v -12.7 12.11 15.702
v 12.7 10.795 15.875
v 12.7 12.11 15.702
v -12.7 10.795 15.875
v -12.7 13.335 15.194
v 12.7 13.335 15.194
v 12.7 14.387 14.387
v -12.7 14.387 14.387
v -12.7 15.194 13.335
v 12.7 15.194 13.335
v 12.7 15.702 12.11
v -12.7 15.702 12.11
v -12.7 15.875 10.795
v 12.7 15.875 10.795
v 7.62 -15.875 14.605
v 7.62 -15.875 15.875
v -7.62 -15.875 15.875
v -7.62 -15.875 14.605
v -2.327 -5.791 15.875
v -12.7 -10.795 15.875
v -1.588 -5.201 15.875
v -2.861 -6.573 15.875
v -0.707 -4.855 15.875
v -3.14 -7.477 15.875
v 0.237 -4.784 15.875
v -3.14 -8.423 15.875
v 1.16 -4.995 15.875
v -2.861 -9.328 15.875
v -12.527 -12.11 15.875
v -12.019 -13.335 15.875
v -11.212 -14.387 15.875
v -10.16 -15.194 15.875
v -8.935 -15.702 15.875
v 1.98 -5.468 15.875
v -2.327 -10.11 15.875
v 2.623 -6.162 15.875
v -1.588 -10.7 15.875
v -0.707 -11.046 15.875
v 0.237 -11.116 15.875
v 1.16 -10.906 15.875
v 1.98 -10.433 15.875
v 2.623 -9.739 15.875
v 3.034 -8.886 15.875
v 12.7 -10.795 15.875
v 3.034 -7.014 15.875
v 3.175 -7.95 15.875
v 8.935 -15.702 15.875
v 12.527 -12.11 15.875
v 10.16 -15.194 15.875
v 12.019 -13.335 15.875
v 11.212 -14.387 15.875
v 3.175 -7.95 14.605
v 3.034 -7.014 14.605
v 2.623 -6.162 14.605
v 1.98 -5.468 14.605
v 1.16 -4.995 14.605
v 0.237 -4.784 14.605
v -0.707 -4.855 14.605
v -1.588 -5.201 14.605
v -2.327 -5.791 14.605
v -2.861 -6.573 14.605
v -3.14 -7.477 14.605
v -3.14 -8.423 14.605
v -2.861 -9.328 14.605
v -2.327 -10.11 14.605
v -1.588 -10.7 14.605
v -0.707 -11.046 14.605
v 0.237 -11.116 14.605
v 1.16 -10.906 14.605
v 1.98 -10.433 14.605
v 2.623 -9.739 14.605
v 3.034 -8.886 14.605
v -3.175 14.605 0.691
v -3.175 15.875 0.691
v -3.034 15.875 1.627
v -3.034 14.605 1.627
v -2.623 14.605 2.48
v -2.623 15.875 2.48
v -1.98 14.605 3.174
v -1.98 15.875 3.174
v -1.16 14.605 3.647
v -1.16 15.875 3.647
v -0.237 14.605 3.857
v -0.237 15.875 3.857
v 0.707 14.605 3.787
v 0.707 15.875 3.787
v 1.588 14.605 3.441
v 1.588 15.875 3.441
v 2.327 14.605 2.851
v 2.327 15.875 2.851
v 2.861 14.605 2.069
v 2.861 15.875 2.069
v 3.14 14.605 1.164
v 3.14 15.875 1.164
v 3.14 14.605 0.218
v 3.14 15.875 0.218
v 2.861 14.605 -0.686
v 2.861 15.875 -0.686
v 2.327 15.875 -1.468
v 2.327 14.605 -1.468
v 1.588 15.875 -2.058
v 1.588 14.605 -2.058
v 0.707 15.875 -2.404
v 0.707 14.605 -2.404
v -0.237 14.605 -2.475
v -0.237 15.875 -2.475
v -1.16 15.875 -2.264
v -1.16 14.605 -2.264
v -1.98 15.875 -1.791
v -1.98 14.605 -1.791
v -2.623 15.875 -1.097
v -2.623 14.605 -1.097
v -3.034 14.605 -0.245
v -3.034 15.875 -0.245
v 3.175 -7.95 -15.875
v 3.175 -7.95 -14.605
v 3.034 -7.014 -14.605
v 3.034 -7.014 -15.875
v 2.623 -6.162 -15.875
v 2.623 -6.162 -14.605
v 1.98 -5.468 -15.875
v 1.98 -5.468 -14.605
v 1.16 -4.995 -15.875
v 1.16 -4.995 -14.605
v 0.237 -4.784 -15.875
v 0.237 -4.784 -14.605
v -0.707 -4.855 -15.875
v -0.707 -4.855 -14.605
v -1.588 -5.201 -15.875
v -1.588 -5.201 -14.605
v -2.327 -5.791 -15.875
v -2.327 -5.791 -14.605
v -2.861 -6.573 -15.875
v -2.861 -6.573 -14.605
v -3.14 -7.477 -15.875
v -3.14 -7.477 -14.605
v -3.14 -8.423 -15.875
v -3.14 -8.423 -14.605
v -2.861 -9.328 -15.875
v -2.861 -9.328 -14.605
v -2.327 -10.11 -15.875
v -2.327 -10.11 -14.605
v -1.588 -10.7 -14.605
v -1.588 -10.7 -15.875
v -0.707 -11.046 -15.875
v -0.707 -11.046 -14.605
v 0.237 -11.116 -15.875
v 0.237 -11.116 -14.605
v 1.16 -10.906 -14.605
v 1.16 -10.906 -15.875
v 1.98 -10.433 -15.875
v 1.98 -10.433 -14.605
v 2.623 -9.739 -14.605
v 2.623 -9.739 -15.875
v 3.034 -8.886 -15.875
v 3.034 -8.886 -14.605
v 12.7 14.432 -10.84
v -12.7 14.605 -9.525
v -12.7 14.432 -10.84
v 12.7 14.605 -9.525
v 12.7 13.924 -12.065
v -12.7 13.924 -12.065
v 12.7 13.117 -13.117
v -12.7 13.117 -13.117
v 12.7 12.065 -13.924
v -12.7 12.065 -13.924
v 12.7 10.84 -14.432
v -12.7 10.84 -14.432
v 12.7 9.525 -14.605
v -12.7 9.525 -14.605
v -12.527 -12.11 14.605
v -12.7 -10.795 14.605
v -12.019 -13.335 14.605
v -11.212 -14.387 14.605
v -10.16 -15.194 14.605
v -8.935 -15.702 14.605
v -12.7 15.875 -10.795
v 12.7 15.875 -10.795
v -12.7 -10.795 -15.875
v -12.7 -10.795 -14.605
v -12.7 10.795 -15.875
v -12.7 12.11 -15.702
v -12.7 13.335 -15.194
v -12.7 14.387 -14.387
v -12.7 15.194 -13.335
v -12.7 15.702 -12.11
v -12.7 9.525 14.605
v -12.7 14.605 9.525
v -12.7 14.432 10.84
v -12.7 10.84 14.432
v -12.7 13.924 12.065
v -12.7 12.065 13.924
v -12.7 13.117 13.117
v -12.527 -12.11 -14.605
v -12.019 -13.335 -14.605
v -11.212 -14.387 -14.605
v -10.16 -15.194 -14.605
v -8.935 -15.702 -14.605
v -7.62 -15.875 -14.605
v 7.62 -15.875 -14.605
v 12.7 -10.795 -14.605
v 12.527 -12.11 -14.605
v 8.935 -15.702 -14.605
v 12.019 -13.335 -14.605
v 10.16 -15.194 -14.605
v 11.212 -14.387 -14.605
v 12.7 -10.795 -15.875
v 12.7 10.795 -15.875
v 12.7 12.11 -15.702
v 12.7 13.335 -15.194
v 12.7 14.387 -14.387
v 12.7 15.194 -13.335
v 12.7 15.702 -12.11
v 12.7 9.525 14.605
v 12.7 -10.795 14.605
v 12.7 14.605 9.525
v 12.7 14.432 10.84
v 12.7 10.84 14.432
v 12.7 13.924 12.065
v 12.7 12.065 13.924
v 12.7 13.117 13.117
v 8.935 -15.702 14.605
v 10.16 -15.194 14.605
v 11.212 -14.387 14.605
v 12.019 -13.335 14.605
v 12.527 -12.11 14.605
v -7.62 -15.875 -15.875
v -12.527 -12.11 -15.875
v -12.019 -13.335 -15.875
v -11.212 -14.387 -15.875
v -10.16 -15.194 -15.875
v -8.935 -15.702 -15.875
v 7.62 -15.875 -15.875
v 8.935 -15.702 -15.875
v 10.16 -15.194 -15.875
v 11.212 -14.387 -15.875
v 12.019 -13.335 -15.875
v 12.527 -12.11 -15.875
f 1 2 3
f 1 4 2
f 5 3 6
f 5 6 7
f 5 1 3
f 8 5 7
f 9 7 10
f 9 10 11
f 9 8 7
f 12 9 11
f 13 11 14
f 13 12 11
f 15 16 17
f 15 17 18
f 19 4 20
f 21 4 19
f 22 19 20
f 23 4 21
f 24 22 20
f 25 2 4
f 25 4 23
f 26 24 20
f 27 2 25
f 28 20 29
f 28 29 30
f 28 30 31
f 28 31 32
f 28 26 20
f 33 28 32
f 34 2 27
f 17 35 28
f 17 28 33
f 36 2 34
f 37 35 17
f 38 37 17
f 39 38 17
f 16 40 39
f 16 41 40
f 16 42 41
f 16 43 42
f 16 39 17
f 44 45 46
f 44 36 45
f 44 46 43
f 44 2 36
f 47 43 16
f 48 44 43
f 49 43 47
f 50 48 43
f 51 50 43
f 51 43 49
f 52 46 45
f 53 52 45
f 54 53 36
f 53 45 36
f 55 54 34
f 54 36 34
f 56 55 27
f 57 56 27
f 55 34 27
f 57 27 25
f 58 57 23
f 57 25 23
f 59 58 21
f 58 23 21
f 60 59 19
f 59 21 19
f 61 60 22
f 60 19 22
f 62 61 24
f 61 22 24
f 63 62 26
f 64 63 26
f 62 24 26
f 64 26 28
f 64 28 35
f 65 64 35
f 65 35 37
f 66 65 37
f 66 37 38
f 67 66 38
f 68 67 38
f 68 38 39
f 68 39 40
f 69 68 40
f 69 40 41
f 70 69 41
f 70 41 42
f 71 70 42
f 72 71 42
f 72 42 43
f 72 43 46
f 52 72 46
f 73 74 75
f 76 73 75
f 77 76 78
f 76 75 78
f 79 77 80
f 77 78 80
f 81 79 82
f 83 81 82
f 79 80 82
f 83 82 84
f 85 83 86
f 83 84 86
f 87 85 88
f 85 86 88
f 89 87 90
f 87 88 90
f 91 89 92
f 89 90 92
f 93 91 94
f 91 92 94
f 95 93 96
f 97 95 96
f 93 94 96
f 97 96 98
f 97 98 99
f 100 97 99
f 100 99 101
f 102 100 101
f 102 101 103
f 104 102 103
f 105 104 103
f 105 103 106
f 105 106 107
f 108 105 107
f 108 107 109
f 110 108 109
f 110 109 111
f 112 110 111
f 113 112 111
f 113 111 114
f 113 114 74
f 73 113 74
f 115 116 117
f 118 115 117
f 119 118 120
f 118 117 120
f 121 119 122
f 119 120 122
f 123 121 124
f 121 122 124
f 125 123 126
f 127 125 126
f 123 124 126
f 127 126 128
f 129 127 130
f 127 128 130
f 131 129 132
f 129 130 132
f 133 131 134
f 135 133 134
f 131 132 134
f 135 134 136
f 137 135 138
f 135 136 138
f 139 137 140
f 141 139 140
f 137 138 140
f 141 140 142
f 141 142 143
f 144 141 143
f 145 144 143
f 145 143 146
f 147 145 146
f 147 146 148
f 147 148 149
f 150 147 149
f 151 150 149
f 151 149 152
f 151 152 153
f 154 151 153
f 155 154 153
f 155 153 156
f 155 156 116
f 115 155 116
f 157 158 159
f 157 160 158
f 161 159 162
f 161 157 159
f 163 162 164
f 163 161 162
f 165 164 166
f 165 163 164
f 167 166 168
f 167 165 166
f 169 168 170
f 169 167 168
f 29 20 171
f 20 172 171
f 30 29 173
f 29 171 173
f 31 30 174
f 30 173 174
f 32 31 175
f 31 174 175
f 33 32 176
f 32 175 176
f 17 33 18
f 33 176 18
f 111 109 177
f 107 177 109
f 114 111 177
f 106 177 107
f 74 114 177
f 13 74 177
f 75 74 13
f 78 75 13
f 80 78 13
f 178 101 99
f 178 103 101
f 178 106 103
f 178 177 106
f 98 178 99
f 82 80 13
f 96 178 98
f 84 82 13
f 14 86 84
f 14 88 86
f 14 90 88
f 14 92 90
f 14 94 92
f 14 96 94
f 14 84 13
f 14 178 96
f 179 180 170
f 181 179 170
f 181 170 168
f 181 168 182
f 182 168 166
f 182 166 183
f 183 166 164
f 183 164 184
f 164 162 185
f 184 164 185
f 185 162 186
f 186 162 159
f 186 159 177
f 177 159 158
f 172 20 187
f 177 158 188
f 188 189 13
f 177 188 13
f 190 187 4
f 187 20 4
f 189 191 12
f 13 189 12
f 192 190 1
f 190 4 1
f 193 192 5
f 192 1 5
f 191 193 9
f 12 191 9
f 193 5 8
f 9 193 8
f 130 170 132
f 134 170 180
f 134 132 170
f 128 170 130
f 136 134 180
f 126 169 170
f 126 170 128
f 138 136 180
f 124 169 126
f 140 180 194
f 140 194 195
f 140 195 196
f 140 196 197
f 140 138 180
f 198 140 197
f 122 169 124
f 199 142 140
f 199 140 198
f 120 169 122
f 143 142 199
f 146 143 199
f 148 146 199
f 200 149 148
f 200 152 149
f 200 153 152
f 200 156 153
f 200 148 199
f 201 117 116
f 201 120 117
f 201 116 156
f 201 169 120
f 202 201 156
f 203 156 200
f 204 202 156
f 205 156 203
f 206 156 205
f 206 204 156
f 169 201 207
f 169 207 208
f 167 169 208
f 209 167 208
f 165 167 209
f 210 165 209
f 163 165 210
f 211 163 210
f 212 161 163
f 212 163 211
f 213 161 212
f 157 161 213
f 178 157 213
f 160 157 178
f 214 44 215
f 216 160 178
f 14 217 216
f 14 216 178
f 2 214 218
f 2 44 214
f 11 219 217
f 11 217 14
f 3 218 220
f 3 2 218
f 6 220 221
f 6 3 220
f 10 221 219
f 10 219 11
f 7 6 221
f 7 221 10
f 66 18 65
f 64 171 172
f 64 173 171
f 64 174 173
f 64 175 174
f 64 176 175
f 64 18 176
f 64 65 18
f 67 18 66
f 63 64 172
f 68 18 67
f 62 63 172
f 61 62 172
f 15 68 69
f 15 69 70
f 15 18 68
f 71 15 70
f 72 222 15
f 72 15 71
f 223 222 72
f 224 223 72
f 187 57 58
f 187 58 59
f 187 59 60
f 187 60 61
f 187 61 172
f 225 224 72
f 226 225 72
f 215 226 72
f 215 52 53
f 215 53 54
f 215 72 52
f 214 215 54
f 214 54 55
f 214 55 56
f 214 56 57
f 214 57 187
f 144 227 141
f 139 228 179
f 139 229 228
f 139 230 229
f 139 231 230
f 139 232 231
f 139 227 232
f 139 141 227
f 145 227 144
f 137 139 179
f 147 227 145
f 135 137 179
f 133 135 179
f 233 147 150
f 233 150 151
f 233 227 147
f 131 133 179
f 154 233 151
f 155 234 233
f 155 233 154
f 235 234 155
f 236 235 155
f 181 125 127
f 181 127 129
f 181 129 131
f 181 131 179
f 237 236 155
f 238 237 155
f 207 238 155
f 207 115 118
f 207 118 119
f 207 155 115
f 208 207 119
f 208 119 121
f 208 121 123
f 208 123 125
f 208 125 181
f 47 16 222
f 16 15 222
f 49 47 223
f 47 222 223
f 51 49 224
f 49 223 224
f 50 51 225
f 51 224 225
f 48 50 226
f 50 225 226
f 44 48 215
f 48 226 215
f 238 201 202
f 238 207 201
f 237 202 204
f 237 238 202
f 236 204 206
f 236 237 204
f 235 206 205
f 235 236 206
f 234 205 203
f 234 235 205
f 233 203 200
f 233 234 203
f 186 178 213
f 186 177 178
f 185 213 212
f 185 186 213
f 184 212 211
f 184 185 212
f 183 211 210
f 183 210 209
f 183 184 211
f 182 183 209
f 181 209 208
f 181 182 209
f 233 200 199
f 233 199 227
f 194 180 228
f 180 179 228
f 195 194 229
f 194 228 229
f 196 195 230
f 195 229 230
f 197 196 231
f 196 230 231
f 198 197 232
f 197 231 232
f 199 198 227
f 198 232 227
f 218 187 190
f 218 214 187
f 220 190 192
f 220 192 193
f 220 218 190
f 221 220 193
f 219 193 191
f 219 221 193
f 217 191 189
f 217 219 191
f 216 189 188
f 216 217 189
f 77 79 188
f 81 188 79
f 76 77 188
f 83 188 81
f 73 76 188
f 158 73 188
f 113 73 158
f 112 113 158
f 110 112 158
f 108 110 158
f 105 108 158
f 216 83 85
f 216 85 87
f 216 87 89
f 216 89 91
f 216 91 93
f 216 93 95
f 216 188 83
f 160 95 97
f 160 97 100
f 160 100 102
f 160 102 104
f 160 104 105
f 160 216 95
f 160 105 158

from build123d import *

# Parameters (mm, degrees)
F1_DEPTH      = 12.7
F1_DEPTH_BACK = 12.7
F2_R          = 3.175
F3_DEPTH      = 31.751
F4_R          = 5.08
F5_R          = 5.08
F6_R          = 3.175
F7_DEPTH      = 31.751


with BuildPart() as f1:
    # F0 (on Right) → F1 (new body, two sides)
    with BuildSketch(Plane.YZ) as f1_sk:
        Polygon((15.875, 15.875), (-15.875, 15.875), (-15.875, 14.605), (-14.605, 14.605), (14.605, 14.605), (14.605, -14.605), (-14.605, -14.605), (-15.875, -14.605), (-15.875, -15.875), (15.875, -15.875), align=None)
    extrude(amount=F1_DEPTH)
    extrude(f1_sk.sketch, amount=-F1_DEPTH_BACK)

    # F2 (on face) → F3 (cut, through all)
    with BuildSketch(Plane.XY.offset(15.875)):
        with Locations((0, -7.9502)):
            Circle(F2_R)
    extrude(amount=-F3_DEPTH, mode=Mode.SUBTRACT)

    # F4
    f4_edges = [f1.edges().sort_by_distance(p)[0] for p in [
        (0, 15.875, 15.875),
        (0, 15.875, -15.875),
        (0, 14.605, 14.605),
        (0, 14.605, -14.605),
    ]]
    fillet(f4_edges, radius=F4_R)

    # F5
    f5_edges = [f1.edges().sort_by_distance(p)[0] for p in [
        (12.7, -15.875, 15.24),
        (-12.7, -15.875, 15.24),
        (12.7, -15.875, -15.24),
        (-12.7, -15.875, -15.24),
    ]]
    fillet(f5_edges, radius=F5_R)

    # F6 (on face) → F7 (cut, through all)
    with BuildSketch(Plane(origin=(0, 15.875, 0), x_dir=(-1, 0, 0), z_dir=(0, 1, 0))):
        with Locations((0, 0.691243)):
            Circle(F6_R)
    extrude(amount=-F7_DEPTH, mode=Mode.SUBTRACT)


solid = f1.part
